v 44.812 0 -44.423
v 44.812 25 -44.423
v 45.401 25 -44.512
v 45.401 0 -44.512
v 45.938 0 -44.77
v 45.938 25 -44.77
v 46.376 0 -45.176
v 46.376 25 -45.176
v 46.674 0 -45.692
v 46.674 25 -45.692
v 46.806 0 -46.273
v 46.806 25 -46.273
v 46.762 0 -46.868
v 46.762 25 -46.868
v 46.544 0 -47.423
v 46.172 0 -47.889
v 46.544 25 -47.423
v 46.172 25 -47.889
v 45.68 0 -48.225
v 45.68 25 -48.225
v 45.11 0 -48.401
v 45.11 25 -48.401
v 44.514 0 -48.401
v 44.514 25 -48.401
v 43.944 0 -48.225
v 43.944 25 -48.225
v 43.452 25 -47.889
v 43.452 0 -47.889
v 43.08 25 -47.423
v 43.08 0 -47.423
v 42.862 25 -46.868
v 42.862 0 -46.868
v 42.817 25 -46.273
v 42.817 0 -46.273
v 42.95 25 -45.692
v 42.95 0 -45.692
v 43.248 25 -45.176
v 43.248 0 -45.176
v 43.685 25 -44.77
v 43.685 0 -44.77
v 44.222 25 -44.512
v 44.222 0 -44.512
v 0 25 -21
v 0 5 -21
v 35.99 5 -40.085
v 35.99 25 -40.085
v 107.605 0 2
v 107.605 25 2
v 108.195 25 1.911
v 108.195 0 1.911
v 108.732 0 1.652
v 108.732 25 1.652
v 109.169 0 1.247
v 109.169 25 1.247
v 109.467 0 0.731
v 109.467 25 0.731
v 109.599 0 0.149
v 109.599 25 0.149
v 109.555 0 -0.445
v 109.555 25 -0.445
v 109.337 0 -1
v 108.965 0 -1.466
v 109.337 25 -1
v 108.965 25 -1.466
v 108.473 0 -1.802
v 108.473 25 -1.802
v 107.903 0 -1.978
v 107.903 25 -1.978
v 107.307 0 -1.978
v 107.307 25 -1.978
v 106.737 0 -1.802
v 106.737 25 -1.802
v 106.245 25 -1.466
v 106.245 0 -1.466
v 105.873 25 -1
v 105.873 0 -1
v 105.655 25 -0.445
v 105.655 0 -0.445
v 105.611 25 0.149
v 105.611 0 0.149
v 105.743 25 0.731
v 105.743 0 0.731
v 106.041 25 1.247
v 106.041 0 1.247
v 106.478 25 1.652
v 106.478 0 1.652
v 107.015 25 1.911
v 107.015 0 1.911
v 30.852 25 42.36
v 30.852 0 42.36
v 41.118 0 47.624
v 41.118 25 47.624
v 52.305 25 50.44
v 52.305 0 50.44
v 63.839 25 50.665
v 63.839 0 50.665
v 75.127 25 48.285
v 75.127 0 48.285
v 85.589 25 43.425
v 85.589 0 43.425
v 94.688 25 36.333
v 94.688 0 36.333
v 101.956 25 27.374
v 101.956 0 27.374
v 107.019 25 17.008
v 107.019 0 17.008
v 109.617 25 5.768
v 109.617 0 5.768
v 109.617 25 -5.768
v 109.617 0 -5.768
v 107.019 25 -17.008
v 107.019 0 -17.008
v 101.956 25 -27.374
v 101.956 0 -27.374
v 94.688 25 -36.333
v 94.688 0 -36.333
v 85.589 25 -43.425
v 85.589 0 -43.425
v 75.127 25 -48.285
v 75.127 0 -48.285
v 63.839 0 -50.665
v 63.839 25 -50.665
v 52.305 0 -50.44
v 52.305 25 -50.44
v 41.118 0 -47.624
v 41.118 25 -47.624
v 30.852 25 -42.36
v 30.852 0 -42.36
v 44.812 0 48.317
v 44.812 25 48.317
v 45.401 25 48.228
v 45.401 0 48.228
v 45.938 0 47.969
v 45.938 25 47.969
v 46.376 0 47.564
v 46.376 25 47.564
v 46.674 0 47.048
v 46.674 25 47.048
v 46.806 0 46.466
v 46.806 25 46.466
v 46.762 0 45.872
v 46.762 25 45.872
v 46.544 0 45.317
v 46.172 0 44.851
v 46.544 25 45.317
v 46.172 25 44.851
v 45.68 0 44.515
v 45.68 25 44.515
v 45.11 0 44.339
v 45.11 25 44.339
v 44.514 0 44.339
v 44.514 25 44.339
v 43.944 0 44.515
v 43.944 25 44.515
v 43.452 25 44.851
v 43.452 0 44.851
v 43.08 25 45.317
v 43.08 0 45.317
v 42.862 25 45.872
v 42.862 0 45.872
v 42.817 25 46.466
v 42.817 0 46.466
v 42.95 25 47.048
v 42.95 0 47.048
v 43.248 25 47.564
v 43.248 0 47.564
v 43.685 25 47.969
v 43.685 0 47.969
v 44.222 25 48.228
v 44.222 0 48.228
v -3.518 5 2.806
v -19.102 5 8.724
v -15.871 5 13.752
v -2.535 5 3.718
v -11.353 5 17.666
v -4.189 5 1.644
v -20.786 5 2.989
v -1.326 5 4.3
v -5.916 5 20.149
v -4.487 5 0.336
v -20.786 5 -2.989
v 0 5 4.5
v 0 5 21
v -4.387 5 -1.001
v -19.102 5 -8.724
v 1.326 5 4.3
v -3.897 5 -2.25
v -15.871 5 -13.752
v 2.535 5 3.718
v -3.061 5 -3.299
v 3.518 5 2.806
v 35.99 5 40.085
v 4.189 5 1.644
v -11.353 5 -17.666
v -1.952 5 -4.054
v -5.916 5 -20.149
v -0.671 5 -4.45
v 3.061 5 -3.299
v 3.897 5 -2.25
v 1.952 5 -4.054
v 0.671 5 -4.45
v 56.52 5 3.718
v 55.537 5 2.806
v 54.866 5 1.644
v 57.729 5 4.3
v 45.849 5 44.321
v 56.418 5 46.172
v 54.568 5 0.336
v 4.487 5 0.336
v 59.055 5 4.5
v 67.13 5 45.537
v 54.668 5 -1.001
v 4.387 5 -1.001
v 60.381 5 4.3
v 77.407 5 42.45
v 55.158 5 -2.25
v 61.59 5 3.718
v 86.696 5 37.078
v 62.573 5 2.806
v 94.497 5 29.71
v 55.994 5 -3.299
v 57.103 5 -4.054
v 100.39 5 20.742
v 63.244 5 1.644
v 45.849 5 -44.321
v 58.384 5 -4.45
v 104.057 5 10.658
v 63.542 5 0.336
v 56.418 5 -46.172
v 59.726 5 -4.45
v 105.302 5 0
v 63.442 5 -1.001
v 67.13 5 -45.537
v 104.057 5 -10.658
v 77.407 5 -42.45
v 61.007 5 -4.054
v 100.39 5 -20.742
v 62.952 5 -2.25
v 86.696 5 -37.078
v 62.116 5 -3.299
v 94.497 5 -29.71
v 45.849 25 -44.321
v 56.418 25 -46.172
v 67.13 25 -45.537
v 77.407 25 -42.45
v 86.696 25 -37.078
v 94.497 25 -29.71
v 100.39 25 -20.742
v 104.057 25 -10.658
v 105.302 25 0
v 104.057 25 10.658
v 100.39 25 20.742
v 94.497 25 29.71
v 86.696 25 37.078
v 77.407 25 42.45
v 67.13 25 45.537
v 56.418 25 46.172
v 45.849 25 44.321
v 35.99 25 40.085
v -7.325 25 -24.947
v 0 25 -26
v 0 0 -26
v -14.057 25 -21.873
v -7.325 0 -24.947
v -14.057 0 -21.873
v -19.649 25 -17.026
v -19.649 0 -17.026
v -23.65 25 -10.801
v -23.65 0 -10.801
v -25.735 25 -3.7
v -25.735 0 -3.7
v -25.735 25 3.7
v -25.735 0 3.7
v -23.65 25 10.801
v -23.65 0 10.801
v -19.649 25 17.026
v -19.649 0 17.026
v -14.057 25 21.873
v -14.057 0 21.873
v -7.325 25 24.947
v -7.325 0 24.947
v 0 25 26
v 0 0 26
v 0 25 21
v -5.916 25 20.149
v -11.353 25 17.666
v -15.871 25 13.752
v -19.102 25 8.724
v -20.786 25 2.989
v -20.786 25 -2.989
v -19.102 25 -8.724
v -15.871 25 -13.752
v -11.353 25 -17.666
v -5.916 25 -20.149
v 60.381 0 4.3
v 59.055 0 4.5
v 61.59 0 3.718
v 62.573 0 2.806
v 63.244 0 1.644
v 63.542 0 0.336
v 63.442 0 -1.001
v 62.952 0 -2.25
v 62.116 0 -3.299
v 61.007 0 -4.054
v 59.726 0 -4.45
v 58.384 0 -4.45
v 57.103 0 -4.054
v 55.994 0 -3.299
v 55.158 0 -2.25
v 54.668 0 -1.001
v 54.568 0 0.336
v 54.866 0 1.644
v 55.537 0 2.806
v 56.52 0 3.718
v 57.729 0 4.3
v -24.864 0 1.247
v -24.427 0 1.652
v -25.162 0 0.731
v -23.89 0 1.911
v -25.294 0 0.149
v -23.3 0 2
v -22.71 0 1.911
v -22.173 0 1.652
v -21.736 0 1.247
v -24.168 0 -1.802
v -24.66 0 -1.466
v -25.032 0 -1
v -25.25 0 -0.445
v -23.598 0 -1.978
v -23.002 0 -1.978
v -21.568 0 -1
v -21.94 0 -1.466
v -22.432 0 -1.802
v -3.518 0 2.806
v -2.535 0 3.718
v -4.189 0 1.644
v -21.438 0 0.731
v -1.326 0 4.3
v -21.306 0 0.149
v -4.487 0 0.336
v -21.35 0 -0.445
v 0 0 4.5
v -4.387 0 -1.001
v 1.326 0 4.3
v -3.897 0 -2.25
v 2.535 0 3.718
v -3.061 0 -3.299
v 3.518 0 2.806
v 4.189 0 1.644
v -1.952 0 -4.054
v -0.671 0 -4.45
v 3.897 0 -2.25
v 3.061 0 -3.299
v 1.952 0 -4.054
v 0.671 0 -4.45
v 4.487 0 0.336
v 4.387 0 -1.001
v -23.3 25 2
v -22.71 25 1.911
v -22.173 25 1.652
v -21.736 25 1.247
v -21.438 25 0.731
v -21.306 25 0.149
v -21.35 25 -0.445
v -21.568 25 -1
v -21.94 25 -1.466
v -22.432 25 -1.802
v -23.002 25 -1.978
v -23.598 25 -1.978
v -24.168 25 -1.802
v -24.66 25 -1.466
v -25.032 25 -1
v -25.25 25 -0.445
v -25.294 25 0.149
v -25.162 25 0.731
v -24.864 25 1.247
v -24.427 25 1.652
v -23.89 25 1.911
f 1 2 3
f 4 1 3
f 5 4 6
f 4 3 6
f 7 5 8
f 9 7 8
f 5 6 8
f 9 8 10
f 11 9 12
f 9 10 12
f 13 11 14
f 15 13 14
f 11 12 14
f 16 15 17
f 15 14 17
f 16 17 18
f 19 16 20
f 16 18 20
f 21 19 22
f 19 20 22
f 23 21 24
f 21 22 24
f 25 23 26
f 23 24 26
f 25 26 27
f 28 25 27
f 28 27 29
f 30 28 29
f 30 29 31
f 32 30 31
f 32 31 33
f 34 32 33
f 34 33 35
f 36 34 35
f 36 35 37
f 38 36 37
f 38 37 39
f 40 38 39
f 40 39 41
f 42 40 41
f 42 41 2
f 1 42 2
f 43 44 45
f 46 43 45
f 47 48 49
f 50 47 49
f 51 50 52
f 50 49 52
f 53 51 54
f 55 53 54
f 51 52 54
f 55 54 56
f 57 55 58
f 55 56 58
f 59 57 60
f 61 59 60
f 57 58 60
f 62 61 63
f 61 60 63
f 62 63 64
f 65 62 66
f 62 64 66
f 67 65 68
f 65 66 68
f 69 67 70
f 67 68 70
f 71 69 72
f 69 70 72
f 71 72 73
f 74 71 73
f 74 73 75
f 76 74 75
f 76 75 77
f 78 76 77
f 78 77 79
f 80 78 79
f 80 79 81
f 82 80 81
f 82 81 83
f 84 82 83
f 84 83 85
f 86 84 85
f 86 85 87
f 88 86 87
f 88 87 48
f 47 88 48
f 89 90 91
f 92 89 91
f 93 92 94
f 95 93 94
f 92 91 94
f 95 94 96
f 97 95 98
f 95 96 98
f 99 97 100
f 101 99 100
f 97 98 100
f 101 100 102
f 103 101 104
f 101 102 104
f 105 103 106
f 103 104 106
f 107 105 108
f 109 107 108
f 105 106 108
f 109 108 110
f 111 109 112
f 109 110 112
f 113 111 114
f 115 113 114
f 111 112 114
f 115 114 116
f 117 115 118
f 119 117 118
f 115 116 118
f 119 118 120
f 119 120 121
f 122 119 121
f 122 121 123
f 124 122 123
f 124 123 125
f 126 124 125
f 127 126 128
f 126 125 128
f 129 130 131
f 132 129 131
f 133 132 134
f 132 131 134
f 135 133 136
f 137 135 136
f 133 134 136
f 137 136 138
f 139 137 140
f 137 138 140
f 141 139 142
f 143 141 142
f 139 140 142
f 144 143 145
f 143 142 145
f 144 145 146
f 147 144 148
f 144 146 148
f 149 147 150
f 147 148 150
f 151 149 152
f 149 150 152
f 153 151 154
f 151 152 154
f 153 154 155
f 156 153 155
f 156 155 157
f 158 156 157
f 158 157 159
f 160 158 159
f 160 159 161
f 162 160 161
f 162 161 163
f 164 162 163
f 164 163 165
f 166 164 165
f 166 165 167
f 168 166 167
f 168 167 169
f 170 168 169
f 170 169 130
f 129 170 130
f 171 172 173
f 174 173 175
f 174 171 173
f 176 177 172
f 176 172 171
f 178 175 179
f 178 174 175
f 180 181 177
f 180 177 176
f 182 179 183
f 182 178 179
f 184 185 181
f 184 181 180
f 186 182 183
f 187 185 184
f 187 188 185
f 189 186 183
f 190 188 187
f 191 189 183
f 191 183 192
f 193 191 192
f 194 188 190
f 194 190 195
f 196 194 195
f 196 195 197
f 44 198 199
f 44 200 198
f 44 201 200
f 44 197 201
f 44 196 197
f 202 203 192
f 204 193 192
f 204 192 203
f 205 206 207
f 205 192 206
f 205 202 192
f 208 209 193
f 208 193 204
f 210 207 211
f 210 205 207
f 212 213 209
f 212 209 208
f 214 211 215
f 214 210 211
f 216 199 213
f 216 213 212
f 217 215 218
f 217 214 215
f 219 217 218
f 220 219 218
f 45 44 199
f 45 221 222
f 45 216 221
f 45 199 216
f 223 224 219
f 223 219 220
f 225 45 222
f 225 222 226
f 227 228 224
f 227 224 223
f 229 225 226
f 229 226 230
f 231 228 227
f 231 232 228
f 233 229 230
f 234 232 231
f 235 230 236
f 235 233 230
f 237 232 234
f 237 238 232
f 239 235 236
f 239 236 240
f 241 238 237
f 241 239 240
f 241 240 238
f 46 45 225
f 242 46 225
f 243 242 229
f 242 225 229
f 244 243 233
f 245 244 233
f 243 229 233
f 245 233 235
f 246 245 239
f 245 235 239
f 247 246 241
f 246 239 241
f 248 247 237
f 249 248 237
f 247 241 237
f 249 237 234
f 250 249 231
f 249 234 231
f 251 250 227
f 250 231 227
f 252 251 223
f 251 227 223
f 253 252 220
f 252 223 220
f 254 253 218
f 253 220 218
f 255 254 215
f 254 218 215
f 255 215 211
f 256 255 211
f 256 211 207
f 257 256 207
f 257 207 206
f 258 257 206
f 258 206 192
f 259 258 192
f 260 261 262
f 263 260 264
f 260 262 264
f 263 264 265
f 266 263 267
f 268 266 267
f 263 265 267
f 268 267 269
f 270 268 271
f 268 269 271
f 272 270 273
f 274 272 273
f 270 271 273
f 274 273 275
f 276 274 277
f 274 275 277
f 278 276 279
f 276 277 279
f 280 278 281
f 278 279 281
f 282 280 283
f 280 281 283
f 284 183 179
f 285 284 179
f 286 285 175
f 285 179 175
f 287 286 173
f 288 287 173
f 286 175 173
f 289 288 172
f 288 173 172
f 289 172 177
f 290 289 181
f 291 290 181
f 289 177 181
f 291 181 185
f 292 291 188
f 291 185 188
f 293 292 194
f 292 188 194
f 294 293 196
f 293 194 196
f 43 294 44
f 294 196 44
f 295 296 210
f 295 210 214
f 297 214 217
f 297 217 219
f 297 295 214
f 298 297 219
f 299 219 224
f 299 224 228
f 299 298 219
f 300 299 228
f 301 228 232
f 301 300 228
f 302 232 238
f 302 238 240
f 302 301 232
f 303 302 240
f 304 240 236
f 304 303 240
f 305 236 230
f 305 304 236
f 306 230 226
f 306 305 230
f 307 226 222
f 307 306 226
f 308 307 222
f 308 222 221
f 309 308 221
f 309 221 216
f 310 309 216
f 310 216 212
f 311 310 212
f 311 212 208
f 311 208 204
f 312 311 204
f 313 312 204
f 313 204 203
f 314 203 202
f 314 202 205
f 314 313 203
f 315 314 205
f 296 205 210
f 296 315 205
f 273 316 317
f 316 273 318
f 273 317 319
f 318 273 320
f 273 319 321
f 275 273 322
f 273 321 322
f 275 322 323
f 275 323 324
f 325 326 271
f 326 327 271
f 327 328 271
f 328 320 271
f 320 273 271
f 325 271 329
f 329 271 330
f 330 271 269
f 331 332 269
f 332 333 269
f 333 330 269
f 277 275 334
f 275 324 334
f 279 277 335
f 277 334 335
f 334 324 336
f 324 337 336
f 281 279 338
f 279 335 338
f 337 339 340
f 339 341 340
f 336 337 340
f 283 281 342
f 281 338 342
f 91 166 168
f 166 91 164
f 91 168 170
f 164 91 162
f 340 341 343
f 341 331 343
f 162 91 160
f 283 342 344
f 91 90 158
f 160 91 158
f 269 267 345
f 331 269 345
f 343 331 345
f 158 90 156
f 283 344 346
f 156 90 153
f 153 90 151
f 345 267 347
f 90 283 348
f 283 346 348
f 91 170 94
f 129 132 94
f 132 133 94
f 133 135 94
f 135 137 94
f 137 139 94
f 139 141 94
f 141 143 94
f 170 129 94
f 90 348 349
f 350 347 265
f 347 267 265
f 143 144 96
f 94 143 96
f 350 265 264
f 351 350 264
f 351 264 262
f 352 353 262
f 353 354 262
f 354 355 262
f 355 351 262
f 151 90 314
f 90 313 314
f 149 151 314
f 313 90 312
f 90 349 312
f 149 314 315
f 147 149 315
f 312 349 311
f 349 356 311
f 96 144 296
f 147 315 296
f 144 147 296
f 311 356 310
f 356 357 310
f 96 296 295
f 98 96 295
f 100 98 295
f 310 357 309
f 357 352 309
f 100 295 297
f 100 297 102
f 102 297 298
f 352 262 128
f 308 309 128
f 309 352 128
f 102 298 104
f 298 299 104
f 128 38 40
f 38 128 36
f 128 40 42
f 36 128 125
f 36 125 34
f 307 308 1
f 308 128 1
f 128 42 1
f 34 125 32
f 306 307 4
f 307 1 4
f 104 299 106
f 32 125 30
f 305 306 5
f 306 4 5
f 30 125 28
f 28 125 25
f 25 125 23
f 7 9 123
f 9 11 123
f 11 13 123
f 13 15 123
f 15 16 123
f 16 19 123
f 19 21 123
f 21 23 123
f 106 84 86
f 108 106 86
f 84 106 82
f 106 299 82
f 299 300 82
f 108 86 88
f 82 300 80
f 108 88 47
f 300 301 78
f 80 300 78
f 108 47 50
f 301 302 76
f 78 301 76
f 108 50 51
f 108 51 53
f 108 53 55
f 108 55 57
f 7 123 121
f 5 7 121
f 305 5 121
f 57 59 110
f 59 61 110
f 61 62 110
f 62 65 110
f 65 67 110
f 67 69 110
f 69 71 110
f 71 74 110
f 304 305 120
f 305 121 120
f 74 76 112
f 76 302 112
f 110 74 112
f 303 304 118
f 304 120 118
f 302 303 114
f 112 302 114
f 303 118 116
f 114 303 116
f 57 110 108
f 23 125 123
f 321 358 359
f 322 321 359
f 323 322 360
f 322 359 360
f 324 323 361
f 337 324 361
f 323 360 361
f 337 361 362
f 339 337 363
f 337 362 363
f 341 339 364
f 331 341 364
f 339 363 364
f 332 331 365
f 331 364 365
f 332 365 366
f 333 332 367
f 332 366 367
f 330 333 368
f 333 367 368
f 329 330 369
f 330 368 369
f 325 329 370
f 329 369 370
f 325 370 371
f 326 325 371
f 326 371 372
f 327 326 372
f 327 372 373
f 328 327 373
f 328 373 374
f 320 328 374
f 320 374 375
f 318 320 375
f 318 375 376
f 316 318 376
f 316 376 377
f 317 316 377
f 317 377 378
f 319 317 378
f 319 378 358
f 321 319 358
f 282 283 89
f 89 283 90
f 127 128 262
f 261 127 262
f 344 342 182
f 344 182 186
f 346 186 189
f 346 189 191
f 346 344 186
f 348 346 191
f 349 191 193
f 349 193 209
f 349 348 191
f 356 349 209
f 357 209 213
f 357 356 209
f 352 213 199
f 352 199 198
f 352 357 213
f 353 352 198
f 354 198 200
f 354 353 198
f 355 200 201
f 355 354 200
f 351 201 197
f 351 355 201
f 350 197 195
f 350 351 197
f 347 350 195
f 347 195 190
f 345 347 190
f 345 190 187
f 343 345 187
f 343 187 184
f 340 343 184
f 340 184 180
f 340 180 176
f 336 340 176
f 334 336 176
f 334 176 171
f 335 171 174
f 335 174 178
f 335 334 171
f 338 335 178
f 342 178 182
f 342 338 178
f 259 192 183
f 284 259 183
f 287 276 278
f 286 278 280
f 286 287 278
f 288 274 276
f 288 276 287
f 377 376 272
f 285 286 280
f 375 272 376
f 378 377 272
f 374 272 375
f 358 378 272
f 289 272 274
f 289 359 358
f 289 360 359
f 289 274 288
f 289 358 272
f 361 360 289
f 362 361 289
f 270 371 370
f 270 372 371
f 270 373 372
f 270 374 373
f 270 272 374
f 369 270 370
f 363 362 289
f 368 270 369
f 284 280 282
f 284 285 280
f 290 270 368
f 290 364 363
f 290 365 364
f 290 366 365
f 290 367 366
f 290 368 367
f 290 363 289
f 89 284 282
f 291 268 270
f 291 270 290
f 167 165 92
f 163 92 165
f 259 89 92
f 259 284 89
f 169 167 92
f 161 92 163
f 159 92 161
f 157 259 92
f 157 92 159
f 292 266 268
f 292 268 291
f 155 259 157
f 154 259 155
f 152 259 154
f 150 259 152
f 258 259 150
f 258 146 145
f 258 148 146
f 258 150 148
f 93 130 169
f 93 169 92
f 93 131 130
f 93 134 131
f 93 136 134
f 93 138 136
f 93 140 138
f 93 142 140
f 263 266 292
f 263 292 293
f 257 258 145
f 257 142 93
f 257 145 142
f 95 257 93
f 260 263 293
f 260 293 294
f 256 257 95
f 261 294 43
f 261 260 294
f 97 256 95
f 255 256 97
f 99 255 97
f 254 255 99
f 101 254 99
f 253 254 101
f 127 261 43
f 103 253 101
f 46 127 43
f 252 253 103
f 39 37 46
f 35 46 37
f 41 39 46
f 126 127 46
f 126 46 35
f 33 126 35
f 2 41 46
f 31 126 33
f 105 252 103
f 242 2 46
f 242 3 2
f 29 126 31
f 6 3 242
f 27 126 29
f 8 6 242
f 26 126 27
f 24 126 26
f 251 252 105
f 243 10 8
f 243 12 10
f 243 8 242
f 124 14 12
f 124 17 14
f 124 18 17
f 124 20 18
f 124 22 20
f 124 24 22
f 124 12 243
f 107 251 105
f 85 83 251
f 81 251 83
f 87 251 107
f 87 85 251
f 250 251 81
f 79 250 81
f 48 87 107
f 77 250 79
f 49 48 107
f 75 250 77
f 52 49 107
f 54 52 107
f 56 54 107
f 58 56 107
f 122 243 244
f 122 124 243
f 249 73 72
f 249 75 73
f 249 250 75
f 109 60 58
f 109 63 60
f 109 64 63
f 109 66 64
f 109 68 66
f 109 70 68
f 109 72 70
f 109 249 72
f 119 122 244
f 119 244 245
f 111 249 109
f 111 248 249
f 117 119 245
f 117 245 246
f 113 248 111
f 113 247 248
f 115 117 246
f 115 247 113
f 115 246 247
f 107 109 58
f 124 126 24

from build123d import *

# Parameters (mm, degrees)
SKETCH2_R           = 4.5
BOSS_EXTRUDE1_DEPTH = 5
BOSS_EXTRUDE4_DEPTH = 20
SKETCH4_R           = 2
CUT_EXTRUDE1_DEPTH  = 40


with BuildPart() as part:
    # Sketch2 → Boss-Extrude1 (new body)
    with BuildSketch(Plane(origin=(0, 0, 0), x_dir=(1, 0, 0), z_dir=(0, 1, 0))):
        with BuildLine():
            Line((30.852324511, 42.360372936), (0, 26))
            ThreePointArc((0, 26), (-26, 0), (0, -26))
            Line((0, -26), (30.852324511, -42.360372936))
            ThreePointArc((30.852324511, -42.360372936), (109.945, 0), (30.852324511, 42.360372936))
        make_face()
        with Locations(Location((0, 0, 0), (0, 0, 270))):
            Circle(SKETCH2_R, mode=Mode.SUBTRACT)
        with Locations(Location((59.055, 0, 0), (0, 0, 270))):
            Circle(SKETCH2_R, mode=Mode.SUBTRACT)
    extrude(amount=BOSS_EXTRUDE1_DEPTH)

    # Sketch3 → Boss-Extrude4 (add)
    with BuildSketch(Plane(origin=(0, 5, 0), x_dir=(1, 0, 0), z_dir=(0, 1, 0))):
        with BuildLine():
            Line((30.852324511, 42.360372936), (0, 26))
            ThreePointArc((0, 26), (-26, 0), (0, -26))
            Line((0, -26), (30.852324511, -42.360372936))
            ThreePointArc((30.852324511, -42.360372936), (109.945, 0), (30.852324511, 42.360372936))
        make_face()
        with BuildLine():
            Line((0, 21), (35.989825914, 40.084687562))
            ThreePointArc((35.989825914, 40.084687562), (105.301993768, 0), (35.989825914, -40.084687562))
            Line((35.989825914, -40.084687562), (0, -21))
            ThreePointArc((0, -21), (-21, 0), (0, 21))
        make_face(mode=Mode.SUBTRACT)
    extrude(amount=BOSS_EXTRUDE4_DEPTH)

    # Sketch4 → Cut-Extrude1 (cut)
    with BuildSketch(Plane(origin=(0, 25, 0), x_dir=(1, 0, 0), z_dir=(0, 1, 0))):
        with Locations(Location((-23.3, 0, 0), (0, 0, 270))):
            Circle(SKETCH4_R)
        with Locations(Location((107.605, 0, 0), (0, 0, 270))):
            Circle(SKETCH4_R)
        with Locations(Location((44.81184785, 46.422862213, 0), (0, 0, 270))):
            Circle(SKETCH4_R)
        with Locations(Location((44.81184785, -46.316966164, 0), (0, 0, 270))):
            Circle(SKETCH4_R)
    extrude(amount=-CUT_EXTRUDE1_DEPTH, mode=Mode.SUBTRACT)


solid = part.part
